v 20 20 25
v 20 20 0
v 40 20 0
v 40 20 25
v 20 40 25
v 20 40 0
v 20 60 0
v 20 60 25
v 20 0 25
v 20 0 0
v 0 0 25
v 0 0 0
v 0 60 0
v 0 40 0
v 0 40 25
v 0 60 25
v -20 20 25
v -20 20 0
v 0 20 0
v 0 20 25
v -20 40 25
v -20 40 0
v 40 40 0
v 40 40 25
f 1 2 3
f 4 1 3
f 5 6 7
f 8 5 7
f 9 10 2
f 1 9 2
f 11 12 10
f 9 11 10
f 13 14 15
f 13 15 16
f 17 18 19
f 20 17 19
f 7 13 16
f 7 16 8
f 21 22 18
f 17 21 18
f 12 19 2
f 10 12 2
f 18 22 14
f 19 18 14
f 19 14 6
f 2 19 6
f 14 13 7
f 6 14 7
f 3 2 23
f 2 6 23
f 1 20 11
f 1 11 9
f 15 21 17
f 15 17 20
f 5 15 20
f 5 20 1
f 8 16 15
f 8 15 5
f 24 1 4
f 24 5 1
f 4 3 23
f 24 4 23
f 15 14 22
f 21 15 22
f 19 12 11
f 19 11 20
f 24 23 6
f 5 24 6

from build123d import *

# Parameters (mm, degrees)
F0_W     = 20
F0_H     = 20
F1_DEPTH = 25


with BuildPart() as f1:
    # F0 (on Top) → F1 (new body)
    with BuildSketch(Plane.XY):
        with Locations((10, 10)):
            Rectangle(F0_W, F0_H)
        Polygon((-20, 20), (0, 20), (0, 30), (0, 40), (-20, 40), align=None)
        Polygon((0, 30), (0, 20), (20, 20), (20, 40), (0, 40), align=None)
        with Locations((30, 30)):
            Rectangle(F0_W, F0_H)
        with Locations((10, 50)):
            Rectangle(F0_W, F0_H)
    extrude(amount=F1_DEPTH)


solid = f1.part
